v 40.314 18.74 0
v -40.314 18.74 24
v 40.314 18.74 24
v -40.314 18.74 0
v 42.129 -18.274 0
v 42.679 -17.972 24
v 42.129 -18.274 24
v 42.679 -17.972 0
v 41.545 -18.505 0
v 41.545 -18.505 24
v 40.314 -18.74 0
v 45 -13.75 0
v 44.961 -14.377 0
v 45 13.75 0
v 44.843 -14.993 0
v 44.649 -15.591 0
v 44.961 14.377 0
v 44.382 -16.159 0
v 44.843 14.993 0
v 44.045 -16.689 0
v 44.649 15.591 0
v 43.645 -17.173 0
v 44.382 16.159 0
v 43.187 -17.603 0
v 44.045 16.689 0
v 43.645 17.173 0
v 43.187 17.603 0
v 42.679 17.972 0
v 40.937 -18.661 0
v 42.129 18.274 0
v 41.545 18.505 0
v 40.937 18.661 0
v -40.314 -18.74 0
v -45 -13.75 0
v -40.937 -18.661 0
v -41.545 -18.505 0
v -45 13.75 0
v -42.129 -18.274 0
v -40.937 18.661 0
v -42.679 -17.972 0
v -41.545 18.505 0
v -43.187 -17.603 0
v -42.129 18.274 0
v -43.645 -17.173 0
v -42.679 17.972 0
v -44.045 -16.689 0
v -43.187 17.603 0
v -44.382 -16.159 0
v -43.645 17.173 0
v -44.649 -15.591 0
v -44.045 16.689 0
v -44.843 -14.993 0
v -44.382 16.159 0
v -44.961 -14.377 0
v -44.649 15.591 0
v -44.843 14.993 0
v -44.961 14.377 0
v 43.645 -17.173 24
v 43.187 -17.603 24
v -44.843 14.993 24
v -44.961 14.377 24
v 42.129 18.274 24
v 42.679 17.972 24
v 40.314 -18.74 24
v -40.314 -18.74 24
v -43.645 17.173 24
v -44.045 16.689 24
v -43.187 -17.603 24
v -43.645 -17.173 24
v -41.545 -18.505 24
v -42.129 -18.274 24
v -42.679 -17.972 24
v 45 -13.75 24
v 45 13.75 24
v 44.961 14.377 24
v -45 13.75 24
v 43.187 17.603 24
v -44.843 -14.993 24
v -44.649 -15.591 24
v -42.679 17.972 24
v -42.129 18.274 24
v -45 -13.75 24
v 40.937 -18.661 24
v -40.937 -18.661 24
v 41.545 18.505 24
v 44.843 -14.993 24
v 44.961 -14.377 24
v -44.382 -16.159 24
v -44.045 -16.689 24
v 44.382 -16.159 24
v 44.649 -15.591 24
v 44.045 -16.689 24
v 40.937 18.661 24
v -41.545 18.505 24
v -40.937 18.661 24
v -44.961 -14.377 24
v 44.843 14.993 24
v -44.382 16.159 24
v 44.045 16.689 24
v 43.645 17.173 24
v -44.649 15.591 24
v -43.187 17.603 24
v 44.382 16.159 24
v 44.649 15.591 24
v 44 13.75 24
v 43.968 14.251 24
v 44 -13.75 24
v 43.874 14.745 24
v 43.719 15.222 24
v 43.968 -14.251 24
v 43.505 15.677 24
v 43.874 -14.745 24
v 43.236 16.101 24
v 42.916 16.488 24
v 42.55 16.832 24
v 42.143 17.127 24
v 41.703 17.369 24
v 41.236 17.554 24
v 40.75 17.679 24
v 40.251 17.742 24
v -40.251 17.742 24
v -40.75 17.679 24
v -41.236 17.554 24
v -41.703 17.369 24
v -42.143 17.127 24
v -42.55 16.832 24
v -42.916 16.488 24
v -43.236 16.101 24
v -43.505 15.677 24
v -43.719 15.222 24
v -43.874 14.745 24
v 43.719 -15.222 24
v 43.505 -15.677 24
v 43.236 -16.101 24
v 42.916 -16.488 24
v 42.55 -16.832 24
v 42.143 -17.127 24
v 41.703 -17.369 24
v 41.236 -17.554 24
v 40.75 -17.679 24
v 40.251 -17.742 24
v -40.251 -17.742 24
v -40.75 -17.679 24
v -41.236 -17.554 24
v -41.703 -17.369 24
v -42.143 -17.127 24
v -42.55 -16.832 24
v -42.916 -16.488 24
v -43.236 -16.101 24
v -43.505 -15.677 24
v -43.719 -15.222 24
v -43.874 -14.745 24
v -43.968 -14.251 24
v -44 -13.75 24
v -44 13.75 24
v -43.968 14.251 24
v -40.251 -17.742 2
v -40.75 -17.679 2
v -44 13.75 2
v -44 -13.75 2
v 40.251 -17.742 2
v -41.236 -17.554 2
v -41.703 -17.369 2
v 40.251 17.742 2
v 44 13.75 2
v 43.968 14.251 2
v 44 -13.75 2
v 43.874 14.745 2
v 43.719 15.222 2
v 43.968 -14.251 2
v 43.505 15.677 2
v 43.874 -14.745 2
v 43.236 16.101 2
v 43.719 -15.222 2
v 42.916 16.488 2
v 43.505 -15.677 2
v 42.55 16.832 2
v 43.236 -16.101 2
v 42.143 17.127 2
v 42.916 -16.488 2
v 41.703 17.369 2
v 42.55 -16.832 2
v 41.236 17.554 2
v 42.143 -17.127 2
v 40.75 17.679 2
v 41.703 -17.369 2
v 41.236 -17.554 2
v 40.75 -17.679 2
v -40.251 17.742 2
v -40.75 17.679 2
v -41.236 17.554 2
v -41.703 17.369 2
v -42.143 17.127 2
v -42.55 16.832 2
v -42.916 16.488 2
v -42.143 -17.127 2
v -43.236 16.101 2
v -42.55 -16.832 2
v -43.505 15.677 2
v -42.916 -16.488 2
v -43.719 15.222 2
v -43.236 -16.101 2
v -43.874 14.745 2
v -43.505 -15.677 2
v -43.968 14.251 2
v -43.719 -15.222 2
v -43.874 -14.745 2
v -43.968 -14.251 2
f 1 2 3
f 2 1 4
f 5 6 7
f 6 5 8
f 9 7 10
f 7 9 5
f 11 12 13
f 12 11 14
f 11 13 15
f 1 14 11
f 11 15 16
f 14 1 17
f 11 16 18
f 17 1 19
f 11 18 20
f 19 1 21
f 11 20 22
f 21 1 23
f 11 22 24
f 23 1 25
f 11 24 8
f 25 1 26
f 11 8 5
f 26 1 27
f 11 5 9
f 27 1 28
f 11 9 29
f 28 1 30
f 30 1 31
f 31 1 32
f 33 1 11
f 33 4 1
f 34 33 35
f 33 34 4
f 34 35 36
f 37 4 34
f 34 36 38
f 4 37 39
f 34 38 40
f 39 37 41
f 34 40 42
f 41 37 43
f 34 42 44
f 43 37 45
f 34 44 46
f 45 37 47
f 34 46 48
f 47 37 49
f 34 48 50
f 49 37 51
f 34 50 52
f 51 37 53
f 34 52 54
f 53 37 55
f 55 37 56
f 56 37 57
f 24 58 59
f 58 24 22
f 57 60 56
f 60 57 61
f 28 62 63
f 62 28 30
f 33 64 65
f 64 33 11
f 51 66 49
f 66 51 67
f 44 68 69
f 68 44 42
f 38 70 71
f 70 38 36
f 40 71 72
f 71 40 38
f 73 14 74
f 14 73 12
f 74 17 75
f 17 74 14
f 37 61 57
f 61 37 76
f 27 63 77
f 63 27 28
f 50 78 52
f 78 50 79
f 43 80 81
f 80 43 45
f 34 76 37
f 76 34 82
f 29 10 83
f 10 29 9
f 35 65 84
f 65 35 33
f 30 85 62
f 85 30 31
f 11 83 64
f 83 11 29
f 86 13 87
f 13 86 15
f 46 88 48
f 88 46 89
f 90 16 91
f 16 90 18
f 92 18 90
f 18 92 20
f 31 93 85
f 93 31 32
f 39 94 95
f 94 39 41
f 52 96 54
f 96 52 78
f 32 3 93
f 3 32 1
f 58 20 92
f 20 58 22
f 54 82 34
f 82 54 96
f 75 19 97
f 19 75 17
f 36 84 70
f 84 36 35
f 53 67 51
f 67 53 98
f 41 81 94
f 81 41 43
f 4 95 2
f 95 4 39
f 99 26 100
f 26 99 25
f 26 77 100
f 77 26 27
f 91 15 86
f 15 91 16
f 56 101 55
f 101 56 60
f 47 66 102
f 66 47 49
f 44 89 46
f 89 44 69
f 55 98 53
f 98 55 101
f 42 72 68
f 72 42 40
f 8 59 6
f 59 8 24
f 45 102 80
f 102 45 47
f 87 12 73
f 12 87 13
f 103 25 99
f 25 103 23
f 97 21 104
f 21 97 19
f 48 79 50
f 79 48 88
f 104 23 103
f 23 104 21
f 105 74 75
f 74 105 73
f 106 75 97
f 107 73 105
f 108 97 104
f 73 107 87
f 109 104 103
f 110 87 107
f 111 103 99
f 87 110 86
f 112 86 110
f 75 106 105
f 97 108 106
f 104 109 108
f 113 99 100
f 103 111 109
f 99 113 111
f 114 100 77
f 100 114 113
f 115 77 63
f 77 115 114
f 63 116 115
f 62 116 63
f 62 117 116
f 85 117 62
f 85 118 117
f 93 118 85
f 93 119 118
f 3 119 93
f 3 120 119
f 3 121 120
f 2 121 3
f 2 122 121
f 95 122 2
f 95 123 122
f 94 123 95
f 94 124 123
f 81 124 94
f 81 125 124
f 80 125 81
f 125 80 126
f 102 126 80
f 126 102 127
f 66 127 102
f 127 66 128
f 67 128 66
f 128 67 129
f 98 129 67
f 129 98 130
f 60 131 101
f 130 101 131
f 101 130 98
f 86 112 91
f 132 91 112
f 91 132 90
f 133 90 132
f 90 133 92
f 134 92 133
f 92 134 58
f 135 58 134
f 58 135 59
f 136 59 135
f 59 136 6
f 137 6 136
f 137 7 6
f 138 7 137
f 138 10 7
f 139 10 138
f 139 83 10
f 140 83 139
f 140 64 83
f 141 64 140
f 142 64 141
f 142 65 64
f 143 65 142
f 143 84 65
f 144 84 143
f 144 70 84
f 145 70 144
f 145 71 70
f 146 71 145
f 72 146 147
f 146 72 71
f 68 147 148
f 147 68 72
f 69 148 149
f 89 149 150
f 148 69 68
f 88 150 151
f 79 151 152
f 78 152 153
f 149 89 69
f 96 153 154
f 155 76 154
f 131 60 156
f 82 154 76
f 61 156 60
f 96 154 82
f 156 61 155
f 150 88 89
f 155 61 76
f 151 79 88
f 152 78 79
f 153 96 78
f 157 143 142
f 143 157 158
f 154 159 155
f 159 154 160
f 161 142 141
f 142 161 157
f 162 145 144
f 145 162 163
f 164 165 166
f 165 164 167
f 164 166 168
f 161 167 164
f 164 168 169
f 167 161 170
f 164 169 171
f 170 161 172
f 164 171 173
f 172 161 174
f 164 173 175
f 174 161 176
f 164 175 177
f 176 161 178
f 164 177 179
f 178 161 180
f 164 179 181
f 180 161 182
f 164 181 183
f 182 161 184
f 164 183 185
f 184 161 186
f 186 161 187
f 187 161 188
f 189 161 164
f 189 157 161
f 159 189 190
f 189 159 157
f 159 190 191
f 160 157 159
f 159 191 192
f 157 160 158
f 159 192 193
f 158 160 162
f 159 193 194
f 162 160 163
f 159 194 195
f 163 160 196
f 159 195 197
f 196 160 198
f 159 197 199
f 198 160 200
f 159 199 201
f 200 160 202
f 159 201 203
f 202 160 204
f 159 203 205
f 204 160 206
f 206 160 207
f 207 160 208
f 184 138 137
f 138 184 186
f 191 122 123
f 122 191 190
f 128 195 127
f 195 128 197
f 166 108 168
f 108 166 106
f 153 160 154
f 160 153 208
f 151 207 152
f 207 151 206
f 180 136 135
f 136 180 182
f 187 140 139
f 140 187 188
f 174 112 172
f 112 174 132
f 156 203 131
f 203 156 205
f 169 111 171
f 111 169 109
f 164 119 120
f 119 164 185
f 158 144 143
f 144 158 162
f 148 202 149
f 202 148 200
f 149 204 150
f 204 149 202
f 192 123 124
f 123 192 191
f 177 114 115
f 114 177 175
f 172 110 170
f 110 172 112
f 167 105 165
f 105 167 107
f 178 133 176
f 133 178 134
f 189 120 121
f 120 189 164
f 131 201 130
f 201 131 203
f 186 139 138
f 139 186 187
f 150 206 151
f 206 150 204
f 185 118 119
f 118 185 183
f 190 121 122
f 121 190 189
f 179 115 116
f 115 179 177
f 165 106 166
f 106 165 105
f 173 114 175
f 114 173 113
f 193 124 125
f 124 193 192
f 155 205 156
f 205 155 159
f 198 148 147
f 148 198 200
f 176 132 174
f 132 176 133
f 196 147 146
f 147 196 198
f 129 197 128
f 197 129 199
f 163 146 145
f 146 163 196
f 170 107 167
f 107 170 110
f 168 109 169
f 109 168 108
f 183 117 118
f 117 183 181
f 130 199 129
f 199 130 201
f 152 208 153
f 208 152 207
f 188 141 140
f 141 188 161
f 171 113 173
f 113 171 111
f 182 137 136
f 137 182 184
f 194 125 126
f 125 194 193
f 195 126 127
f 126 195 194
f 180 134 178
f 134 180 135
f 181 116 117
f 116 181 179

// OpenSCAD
$fn = 50;


difference() {
	union() {
		hull() {
			translate(v = [-40.0000000000, 13.7500000000, 0]) {
				cylinder(h = 24, r = 5);
			}
			translate(v = [40.0000000000, 13.7500000000, 0]) {
				cylinder(h = 24, r = 5);
			}
			translate(v = [-40.0000000000, -13.7500000000, 0]) {
				cylinder(h = 24, r = 5);
			}
			translate(v = [40.0000000000, -13.7500000000, 0]) {
				cylinder(h = 24, r = 5);
			}
		}
	}
	union() {
		translate(v = [0, 0, 2]) {
			#hull() {
				translate(v = [-40.0000000000, 13.7500000000, 0]) {
					cylinder(h = 22, r = 4);
				}
				translate(v = [40.0000000000, 13.7500000000, 0]) {
					cylinder(h = 22, r = 4);
				}
				translate(v = [-40.0000000000, -13.7500000000, 0]) {
					cylinder(h = 22, r = 4);
				}
				translate(v = [40.0000000000, -13.7500000000, 0]) {
					cylinder(h = 22, r = 4);
				}
			}
		}
	}
}
